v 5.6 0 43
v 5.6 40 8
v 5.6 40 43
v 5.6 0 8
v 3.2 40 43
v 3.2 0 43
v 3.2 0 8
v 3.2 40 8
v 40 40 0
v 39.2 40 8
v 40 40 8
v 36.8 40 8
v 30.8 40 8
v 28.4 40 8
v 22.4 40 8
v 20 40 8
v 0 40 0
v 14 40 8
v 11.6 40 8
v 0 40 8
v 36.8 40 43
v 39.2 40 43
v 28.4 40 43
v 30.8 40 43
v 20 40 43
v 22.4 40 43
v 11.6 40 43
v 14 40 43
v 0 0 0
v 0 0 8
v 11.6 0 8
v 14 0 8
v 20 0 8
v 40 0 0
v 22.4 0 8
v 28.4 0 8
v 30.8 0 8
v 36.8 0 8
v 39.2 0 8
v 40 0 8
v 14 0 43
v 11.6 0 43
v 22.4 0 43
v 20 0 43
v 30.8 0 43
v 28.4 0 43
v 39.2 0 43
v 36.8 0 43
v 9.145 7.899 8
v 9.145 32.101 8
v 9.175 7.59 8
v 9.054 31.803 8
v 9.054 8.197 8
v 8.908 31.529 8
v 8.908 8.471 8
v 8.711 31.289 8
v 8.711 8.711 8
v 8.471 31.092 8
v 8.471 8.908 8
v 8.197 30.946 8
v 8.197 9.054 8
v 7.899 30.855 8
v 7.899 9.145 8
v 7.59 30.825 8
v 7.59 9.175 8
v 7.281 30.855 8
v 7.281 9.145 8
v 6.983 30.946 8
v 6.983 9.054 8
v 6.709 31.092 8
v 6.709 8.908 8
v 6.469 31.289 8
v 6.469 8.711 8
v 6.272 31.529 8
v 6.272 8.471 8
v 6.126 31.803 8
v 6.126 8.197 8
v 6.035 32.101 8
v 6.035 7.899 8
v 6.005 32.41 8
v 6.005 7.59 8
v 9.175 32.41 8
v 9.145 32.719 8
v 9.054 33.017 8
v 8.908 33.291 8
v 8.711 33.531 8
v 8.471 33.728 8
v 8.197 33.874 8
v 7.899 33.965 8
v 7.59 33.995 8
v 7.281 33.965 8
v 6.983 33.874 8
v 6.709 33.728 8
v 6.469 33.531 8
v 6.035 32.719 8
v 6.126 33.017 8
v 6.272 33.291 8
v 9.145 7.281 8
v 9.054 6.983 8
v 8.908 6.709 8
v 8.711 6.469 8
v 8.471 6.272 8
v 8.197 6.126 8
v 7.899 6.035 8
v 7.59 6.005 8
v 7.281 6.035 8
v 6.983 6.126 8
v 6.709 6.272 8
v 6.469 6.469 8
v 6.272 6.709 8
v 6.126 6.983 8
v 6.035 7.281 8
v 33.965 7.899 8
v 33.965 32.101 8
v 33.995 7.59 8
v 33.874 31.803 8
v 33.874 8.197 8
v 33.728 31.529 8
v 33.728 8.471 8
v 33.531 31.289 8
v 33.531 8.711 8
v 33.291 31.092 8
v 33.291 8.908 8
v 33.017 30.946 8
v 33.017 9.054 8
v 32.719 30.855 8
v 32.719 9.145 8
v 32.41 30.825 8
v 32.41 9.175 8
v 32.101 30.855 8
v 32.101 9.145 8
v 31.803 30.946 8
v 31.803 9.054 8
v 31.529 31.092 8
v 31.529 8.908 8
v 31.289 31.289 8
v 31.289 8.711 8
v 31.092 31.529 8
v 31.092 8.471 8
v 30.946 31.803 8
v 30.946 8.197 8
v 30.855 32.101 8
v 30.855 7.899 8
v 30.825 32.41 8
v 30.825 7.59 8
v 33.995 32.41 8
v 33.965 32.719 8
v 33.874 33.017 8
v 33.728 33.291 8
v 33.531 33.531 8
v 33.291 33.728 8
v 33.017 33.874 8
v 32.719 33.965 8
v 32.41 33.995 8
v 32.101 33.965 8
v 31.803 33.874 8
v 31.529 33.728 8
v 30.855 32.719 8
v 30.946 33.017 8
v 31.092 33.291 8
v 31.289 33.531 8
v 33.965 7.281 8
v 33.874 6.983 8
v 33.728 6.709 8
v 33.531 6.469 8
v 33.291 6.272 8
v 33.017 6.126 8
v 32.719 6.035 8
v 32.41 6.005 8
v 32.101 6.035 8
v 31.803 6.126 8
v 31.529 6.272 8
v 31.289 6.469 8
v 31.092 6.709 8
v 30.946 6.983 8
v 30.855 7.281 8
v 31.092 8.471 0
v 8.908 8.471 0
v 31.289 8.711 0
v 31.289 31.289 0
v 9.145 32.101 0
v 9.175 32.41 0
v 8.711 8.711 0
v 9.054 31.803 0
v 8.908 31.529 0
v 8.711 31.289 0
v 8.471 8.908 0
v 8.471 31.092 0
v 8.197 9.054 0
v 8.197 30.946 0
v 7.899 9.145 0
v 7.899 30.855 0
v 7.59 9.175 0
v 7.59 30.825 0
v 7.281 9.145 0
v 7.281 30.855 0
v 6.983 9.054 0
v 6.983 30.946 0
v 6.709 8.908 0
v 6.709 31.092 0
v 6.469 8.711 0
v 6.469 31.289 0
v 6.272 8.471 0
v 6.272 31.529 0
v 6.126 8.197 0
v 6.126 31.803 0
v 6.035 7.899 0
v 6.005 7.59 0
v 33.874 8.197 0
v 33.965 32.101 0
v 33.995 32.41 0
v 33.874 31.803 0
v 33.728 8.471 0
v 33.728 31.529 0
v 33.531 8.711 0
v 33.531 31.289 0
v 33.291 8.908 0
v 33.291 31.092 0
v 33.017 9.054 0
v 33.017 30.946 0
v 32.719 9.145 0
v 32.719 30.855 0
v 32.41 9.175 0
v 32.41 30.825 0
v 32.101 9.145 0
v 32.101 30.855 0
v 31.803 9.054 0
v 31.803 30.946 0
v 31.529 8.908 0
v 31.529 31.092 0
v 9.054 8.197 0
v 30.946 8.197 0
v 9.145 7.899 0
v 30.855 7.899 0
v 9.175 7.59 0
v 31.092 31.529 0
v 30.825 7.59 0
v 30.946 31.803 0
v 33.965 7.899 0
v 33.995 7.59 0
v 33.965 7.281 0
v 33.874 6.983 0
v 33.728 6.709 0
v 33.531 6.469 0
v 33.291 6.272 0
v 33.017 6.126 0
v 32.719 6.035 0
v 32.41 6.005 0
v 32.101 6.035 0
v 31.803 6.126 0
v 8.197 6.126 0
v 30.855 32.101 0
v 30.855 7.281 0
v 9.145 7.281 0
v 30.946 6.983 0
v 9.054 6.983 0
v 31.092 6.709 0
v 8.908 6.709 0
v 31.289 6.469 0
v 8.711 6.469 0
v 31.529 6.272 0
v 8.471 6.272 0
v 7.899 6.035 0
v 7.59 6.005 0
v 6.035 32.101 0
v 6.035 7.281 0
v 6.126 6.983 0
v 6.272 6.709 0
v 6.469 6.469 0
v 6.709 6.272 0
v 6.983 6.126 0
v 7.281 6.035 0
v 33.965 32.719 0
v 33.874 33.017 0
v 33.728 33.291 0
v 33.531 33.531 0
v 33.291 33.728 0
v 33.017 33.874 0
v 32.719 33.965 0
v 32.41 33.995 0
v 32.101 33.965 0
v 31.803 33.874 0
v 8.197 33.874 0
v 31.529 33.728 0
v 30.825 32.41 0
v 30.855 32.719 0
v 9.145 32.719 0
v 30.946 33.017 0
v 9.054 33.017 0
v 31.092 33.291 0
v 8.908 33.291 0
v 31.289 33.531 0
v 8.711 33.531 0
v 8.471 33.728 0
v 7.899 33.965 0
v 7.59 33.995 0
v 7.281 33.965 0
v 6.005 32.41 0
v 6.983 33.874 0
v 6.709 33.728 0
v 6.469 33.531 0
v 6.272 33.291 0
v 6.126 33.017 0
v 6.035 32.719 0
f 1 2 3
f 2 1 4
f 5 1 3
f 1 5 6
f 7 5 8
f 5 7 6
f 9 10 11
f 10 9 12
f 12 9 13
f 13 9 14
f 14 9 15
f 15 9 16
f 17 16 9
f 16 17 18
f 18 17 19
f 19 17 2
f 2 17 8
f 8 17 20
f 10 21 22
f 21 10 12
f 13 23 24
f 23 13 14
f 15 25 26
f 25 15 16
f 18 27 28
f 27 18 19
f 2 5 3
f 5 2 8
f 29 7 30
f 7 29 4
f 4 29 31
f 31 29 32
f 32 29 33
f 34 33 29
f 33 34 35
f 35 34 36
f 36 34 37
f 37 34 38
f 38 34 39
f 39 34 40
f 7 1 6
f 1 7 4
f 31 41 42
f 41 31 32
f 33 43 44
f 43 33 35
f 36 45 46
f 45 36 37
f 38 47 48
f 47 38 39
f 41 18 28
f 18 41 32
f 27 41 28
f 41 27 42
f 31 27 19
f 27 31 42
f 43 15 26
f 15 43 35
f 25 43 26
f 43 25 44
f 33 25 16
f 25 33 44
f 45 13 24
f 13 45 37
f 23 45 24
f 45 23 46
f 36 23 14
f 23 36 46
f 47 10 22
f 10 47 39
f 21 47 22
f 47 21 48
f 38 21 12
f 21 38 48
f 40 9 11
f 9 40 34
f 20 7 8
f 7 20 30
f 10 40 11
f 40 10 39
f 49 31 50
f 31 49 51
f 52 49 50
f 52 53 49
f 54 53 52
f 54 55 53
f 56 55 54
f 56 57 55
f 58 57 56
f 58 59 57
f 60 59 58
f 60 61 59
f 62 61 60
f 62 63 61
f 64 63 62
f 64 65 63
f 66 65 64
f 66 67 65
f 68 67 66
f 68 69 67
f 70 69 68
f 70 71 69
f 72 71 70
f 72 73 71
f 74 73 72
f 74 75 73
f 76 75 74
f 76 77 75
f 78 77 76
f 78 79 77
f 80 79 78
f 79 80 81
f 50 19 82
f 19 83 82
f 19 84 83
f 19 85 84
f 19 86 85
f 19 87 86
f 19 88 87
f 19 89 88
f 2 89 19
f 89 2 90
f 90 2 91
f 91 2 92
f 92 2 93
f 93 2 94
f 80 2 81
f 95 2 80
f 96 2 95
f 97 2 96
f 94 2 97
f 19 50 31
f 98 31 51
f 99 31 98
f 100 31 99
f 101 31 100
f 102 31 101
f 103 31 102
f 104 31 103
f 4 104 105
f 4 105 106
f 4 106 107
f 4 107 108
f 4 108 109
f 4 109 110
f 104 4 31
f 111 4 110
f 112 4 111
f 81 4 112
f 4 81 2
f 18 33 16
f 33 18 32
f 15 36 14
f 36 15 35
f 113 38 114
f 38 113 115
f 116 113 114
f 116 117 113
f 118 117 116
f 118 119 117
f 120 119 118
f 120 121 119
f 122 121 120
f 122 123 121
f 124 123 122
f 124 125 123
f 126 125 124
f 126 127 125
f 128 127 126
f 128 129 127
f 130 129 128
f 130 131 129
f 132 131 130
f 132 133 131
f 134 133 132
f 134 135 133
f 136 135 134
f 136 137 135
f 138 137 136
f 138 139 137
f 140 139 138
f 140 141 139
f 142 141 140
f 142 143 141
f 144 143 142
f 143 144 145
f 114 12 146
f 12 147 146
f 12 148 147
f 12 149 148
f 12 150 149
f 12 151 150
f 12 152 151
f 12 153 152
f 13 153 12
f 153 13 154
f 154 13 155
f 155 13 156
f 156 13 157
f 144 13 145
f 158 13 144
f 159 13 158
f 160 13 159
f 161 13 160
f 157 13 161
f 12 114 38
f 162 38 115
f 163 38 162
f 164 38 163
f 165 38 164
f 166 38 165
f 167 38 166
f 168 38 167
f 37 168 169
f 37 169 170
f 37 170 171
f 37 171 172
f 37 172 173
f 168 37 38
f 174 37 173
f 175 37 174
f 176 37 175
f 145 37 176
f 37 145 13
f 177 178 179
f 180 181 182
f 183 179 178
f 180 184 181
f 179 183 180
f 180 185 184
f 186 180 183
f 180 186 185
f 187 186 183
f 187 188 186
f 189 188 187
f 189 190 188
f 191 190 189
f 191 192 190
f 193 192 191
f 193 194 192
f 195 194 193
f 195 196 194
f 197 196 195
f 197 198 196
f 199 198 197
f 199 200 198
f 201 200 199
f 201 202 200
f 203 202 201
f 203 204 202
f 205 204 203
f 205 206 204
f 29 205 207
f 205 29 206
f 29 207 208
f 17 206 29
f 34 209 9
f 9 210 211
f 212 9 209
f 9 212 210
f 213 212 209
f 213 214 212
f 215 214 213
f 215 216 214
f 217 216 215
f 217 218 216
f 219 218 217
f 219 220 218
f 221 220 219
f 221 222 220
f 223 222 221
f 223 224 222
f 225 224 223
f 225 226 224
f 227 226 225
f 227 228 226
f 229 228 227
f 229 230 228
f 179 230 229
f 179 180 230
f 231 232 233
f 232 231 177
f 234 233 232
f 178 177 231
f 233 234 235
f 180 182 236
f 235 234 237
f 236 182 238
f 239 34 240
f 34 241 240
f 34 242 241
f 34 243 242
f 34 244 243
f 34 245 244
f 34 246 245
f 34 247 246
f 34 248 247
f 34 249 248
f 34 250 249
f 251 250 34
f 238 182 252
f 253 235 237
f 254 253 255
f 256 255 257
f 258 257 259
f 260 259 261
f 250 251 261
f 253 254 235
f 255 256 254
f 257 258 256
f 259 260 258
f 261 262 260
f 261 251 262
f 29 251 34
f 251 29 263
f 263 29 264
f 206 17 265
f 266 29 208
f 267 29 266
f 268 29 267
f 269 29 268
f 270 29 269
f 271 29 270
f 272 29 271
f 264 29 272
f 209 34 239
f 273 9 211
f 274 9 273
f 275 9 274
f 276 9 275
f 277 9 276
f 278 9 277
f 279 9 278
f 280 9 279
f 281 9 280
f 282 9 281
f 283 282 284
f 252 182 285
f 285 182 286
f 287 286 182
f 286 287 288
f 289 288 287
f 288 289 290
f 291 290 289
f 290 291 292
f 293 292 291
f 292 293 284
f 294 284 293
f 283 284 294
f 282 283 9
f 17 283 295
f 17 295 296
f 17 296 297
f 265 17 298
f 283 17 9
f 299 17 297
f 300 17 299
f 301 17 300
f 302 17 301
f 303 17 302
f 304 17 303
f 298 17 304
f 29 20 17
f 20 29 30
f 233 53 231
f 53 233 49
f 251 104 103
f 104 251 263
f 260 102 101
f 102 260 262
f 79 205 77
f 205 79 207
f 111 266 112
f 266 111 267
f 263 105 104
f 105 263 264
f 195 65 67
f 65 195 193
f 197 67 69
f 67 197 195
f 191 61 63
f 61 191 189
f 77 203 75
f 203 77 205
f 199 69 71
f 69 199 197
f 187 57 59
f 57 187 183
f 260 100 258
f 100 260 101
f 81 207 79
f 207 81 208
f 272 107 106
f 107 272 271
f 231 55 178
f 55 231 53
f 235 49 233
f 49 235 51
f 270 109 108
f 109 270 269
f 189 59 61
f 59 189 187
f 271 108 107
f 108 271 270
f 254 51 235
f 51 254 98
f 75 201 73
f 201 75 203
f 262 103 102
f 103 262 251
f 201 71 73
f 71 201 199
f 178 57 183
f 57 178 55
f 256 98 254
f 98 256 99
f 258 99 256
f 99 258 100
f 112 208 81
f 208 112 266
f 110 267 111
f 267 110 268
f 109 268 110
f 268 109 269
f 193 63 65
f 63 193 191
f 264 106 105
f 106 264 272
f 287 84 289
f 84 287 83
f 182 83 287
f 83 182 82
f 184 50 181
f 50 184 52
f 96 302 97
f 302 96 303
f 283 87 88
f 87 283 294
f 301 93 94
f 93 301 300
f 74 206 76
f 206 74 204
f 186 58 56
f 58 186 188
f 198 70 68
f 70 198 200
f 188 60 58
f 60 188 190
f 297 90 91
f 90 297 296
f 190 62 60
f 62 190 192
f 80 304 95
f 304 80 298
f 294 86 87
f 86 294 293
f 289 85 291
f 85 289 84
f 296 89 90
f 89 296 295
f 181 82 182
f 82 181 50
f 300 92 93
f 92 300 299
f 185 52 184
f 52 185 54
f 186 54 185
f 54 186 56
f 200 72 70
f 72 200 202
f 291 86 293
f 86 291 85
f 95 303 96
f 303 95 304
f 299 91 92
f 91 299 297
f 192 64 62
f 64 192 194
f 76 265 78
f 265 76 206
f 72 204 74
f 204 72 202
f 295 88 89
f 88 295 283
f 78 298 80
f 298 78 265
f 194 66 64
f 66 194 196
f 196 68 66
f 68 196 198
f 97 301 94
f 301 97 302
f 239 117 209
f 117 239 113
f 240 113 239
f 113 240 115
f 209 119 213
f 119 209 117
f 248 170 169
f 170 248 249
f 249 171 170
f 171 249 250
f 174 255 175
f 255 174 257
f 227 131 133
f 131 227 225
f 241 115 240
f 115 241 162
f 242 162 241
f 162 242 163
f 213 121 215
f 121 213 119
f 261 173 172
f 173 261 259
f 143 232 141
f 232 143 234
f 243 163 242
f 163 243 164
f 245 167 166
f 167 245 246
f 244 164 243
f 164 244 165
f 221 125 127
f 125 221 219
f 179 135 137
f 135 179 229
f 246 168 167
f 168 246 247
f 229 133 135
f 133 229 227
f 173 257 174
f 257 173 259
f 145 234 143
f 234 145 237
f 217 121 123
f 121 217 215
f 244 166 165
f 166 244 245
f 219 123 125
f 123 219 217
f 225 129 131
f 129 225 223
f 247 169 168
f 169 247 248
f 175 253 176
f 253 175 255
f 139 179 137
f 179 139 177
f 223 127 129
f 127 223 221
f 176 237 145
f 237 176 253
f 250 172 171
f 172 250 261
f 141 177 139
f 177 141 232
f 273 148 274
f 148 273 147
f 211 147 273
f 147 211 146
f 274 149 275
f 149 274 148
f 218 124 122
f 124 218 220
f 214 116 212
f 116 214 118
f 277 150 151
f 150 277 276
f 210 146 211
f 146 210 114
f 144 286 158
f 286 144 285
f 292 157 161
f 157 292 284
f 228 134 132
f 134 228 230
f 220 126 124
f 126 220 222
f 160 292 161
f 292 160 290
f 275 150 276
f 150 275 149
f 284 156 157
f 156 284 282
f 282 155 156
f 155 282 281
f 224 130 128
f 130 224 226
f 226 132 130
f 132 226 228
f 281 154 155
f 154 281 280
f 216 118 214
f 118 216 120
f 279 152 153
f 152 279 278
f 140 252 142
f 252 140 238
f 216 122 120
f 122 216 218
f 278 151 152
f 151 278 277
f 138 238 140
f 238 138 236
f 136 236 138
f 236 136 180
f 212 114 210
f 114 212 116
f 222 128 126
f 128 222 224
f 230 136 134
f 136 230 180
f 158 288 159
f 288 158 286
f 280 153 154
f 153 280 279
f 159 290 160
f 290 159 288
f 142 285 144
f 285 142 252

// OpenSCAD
$fn = 32;

// ----------------------------------------------------------------------
// Finned heat sink: 40 x 40 mm base, 35 mm fins
// ----------------------------------------------------------------------

// --- parameters (mm) ---
base_w = 40;              // base width
base_d = 40;              // base depth
base_t = 8;               // base thickness
fin_h = 35;               // fin height above the base
holes_d = 3.17;           // fixing holes
hole_x = 12.41;           // hole offset in x
hole_y = 12.41;           // hole offset in y
fin_t = 2.4;              // fin thickness
fin_pitch = 8.4;          // fin pitch
fin_count = 5;            // number of fins
fin_x0 = 3.2;             // first fin offset

difference() {
  union() {
    cube([base_w, base_d, base_t]);
    for (i = [0 : fin_count - 1]) {
      translate([fin_x0 + i * fin_pitch, 0, base_t - 0.5]) cube([fin_t, base_d, fin_h + 0.5]);
    }
  }
  /* fixing holes through the base, 2.5 mm clear on both sides */
  for (hx = [-12.41, 12.41]) {
    for (hy = [-12.41, 12.41]) {
      translate([base_w / 2 + hx, base_d / 2 + hy, -2.5]) cylinder(h = base_t + 5, d = holes_d);
    }
  }
}
